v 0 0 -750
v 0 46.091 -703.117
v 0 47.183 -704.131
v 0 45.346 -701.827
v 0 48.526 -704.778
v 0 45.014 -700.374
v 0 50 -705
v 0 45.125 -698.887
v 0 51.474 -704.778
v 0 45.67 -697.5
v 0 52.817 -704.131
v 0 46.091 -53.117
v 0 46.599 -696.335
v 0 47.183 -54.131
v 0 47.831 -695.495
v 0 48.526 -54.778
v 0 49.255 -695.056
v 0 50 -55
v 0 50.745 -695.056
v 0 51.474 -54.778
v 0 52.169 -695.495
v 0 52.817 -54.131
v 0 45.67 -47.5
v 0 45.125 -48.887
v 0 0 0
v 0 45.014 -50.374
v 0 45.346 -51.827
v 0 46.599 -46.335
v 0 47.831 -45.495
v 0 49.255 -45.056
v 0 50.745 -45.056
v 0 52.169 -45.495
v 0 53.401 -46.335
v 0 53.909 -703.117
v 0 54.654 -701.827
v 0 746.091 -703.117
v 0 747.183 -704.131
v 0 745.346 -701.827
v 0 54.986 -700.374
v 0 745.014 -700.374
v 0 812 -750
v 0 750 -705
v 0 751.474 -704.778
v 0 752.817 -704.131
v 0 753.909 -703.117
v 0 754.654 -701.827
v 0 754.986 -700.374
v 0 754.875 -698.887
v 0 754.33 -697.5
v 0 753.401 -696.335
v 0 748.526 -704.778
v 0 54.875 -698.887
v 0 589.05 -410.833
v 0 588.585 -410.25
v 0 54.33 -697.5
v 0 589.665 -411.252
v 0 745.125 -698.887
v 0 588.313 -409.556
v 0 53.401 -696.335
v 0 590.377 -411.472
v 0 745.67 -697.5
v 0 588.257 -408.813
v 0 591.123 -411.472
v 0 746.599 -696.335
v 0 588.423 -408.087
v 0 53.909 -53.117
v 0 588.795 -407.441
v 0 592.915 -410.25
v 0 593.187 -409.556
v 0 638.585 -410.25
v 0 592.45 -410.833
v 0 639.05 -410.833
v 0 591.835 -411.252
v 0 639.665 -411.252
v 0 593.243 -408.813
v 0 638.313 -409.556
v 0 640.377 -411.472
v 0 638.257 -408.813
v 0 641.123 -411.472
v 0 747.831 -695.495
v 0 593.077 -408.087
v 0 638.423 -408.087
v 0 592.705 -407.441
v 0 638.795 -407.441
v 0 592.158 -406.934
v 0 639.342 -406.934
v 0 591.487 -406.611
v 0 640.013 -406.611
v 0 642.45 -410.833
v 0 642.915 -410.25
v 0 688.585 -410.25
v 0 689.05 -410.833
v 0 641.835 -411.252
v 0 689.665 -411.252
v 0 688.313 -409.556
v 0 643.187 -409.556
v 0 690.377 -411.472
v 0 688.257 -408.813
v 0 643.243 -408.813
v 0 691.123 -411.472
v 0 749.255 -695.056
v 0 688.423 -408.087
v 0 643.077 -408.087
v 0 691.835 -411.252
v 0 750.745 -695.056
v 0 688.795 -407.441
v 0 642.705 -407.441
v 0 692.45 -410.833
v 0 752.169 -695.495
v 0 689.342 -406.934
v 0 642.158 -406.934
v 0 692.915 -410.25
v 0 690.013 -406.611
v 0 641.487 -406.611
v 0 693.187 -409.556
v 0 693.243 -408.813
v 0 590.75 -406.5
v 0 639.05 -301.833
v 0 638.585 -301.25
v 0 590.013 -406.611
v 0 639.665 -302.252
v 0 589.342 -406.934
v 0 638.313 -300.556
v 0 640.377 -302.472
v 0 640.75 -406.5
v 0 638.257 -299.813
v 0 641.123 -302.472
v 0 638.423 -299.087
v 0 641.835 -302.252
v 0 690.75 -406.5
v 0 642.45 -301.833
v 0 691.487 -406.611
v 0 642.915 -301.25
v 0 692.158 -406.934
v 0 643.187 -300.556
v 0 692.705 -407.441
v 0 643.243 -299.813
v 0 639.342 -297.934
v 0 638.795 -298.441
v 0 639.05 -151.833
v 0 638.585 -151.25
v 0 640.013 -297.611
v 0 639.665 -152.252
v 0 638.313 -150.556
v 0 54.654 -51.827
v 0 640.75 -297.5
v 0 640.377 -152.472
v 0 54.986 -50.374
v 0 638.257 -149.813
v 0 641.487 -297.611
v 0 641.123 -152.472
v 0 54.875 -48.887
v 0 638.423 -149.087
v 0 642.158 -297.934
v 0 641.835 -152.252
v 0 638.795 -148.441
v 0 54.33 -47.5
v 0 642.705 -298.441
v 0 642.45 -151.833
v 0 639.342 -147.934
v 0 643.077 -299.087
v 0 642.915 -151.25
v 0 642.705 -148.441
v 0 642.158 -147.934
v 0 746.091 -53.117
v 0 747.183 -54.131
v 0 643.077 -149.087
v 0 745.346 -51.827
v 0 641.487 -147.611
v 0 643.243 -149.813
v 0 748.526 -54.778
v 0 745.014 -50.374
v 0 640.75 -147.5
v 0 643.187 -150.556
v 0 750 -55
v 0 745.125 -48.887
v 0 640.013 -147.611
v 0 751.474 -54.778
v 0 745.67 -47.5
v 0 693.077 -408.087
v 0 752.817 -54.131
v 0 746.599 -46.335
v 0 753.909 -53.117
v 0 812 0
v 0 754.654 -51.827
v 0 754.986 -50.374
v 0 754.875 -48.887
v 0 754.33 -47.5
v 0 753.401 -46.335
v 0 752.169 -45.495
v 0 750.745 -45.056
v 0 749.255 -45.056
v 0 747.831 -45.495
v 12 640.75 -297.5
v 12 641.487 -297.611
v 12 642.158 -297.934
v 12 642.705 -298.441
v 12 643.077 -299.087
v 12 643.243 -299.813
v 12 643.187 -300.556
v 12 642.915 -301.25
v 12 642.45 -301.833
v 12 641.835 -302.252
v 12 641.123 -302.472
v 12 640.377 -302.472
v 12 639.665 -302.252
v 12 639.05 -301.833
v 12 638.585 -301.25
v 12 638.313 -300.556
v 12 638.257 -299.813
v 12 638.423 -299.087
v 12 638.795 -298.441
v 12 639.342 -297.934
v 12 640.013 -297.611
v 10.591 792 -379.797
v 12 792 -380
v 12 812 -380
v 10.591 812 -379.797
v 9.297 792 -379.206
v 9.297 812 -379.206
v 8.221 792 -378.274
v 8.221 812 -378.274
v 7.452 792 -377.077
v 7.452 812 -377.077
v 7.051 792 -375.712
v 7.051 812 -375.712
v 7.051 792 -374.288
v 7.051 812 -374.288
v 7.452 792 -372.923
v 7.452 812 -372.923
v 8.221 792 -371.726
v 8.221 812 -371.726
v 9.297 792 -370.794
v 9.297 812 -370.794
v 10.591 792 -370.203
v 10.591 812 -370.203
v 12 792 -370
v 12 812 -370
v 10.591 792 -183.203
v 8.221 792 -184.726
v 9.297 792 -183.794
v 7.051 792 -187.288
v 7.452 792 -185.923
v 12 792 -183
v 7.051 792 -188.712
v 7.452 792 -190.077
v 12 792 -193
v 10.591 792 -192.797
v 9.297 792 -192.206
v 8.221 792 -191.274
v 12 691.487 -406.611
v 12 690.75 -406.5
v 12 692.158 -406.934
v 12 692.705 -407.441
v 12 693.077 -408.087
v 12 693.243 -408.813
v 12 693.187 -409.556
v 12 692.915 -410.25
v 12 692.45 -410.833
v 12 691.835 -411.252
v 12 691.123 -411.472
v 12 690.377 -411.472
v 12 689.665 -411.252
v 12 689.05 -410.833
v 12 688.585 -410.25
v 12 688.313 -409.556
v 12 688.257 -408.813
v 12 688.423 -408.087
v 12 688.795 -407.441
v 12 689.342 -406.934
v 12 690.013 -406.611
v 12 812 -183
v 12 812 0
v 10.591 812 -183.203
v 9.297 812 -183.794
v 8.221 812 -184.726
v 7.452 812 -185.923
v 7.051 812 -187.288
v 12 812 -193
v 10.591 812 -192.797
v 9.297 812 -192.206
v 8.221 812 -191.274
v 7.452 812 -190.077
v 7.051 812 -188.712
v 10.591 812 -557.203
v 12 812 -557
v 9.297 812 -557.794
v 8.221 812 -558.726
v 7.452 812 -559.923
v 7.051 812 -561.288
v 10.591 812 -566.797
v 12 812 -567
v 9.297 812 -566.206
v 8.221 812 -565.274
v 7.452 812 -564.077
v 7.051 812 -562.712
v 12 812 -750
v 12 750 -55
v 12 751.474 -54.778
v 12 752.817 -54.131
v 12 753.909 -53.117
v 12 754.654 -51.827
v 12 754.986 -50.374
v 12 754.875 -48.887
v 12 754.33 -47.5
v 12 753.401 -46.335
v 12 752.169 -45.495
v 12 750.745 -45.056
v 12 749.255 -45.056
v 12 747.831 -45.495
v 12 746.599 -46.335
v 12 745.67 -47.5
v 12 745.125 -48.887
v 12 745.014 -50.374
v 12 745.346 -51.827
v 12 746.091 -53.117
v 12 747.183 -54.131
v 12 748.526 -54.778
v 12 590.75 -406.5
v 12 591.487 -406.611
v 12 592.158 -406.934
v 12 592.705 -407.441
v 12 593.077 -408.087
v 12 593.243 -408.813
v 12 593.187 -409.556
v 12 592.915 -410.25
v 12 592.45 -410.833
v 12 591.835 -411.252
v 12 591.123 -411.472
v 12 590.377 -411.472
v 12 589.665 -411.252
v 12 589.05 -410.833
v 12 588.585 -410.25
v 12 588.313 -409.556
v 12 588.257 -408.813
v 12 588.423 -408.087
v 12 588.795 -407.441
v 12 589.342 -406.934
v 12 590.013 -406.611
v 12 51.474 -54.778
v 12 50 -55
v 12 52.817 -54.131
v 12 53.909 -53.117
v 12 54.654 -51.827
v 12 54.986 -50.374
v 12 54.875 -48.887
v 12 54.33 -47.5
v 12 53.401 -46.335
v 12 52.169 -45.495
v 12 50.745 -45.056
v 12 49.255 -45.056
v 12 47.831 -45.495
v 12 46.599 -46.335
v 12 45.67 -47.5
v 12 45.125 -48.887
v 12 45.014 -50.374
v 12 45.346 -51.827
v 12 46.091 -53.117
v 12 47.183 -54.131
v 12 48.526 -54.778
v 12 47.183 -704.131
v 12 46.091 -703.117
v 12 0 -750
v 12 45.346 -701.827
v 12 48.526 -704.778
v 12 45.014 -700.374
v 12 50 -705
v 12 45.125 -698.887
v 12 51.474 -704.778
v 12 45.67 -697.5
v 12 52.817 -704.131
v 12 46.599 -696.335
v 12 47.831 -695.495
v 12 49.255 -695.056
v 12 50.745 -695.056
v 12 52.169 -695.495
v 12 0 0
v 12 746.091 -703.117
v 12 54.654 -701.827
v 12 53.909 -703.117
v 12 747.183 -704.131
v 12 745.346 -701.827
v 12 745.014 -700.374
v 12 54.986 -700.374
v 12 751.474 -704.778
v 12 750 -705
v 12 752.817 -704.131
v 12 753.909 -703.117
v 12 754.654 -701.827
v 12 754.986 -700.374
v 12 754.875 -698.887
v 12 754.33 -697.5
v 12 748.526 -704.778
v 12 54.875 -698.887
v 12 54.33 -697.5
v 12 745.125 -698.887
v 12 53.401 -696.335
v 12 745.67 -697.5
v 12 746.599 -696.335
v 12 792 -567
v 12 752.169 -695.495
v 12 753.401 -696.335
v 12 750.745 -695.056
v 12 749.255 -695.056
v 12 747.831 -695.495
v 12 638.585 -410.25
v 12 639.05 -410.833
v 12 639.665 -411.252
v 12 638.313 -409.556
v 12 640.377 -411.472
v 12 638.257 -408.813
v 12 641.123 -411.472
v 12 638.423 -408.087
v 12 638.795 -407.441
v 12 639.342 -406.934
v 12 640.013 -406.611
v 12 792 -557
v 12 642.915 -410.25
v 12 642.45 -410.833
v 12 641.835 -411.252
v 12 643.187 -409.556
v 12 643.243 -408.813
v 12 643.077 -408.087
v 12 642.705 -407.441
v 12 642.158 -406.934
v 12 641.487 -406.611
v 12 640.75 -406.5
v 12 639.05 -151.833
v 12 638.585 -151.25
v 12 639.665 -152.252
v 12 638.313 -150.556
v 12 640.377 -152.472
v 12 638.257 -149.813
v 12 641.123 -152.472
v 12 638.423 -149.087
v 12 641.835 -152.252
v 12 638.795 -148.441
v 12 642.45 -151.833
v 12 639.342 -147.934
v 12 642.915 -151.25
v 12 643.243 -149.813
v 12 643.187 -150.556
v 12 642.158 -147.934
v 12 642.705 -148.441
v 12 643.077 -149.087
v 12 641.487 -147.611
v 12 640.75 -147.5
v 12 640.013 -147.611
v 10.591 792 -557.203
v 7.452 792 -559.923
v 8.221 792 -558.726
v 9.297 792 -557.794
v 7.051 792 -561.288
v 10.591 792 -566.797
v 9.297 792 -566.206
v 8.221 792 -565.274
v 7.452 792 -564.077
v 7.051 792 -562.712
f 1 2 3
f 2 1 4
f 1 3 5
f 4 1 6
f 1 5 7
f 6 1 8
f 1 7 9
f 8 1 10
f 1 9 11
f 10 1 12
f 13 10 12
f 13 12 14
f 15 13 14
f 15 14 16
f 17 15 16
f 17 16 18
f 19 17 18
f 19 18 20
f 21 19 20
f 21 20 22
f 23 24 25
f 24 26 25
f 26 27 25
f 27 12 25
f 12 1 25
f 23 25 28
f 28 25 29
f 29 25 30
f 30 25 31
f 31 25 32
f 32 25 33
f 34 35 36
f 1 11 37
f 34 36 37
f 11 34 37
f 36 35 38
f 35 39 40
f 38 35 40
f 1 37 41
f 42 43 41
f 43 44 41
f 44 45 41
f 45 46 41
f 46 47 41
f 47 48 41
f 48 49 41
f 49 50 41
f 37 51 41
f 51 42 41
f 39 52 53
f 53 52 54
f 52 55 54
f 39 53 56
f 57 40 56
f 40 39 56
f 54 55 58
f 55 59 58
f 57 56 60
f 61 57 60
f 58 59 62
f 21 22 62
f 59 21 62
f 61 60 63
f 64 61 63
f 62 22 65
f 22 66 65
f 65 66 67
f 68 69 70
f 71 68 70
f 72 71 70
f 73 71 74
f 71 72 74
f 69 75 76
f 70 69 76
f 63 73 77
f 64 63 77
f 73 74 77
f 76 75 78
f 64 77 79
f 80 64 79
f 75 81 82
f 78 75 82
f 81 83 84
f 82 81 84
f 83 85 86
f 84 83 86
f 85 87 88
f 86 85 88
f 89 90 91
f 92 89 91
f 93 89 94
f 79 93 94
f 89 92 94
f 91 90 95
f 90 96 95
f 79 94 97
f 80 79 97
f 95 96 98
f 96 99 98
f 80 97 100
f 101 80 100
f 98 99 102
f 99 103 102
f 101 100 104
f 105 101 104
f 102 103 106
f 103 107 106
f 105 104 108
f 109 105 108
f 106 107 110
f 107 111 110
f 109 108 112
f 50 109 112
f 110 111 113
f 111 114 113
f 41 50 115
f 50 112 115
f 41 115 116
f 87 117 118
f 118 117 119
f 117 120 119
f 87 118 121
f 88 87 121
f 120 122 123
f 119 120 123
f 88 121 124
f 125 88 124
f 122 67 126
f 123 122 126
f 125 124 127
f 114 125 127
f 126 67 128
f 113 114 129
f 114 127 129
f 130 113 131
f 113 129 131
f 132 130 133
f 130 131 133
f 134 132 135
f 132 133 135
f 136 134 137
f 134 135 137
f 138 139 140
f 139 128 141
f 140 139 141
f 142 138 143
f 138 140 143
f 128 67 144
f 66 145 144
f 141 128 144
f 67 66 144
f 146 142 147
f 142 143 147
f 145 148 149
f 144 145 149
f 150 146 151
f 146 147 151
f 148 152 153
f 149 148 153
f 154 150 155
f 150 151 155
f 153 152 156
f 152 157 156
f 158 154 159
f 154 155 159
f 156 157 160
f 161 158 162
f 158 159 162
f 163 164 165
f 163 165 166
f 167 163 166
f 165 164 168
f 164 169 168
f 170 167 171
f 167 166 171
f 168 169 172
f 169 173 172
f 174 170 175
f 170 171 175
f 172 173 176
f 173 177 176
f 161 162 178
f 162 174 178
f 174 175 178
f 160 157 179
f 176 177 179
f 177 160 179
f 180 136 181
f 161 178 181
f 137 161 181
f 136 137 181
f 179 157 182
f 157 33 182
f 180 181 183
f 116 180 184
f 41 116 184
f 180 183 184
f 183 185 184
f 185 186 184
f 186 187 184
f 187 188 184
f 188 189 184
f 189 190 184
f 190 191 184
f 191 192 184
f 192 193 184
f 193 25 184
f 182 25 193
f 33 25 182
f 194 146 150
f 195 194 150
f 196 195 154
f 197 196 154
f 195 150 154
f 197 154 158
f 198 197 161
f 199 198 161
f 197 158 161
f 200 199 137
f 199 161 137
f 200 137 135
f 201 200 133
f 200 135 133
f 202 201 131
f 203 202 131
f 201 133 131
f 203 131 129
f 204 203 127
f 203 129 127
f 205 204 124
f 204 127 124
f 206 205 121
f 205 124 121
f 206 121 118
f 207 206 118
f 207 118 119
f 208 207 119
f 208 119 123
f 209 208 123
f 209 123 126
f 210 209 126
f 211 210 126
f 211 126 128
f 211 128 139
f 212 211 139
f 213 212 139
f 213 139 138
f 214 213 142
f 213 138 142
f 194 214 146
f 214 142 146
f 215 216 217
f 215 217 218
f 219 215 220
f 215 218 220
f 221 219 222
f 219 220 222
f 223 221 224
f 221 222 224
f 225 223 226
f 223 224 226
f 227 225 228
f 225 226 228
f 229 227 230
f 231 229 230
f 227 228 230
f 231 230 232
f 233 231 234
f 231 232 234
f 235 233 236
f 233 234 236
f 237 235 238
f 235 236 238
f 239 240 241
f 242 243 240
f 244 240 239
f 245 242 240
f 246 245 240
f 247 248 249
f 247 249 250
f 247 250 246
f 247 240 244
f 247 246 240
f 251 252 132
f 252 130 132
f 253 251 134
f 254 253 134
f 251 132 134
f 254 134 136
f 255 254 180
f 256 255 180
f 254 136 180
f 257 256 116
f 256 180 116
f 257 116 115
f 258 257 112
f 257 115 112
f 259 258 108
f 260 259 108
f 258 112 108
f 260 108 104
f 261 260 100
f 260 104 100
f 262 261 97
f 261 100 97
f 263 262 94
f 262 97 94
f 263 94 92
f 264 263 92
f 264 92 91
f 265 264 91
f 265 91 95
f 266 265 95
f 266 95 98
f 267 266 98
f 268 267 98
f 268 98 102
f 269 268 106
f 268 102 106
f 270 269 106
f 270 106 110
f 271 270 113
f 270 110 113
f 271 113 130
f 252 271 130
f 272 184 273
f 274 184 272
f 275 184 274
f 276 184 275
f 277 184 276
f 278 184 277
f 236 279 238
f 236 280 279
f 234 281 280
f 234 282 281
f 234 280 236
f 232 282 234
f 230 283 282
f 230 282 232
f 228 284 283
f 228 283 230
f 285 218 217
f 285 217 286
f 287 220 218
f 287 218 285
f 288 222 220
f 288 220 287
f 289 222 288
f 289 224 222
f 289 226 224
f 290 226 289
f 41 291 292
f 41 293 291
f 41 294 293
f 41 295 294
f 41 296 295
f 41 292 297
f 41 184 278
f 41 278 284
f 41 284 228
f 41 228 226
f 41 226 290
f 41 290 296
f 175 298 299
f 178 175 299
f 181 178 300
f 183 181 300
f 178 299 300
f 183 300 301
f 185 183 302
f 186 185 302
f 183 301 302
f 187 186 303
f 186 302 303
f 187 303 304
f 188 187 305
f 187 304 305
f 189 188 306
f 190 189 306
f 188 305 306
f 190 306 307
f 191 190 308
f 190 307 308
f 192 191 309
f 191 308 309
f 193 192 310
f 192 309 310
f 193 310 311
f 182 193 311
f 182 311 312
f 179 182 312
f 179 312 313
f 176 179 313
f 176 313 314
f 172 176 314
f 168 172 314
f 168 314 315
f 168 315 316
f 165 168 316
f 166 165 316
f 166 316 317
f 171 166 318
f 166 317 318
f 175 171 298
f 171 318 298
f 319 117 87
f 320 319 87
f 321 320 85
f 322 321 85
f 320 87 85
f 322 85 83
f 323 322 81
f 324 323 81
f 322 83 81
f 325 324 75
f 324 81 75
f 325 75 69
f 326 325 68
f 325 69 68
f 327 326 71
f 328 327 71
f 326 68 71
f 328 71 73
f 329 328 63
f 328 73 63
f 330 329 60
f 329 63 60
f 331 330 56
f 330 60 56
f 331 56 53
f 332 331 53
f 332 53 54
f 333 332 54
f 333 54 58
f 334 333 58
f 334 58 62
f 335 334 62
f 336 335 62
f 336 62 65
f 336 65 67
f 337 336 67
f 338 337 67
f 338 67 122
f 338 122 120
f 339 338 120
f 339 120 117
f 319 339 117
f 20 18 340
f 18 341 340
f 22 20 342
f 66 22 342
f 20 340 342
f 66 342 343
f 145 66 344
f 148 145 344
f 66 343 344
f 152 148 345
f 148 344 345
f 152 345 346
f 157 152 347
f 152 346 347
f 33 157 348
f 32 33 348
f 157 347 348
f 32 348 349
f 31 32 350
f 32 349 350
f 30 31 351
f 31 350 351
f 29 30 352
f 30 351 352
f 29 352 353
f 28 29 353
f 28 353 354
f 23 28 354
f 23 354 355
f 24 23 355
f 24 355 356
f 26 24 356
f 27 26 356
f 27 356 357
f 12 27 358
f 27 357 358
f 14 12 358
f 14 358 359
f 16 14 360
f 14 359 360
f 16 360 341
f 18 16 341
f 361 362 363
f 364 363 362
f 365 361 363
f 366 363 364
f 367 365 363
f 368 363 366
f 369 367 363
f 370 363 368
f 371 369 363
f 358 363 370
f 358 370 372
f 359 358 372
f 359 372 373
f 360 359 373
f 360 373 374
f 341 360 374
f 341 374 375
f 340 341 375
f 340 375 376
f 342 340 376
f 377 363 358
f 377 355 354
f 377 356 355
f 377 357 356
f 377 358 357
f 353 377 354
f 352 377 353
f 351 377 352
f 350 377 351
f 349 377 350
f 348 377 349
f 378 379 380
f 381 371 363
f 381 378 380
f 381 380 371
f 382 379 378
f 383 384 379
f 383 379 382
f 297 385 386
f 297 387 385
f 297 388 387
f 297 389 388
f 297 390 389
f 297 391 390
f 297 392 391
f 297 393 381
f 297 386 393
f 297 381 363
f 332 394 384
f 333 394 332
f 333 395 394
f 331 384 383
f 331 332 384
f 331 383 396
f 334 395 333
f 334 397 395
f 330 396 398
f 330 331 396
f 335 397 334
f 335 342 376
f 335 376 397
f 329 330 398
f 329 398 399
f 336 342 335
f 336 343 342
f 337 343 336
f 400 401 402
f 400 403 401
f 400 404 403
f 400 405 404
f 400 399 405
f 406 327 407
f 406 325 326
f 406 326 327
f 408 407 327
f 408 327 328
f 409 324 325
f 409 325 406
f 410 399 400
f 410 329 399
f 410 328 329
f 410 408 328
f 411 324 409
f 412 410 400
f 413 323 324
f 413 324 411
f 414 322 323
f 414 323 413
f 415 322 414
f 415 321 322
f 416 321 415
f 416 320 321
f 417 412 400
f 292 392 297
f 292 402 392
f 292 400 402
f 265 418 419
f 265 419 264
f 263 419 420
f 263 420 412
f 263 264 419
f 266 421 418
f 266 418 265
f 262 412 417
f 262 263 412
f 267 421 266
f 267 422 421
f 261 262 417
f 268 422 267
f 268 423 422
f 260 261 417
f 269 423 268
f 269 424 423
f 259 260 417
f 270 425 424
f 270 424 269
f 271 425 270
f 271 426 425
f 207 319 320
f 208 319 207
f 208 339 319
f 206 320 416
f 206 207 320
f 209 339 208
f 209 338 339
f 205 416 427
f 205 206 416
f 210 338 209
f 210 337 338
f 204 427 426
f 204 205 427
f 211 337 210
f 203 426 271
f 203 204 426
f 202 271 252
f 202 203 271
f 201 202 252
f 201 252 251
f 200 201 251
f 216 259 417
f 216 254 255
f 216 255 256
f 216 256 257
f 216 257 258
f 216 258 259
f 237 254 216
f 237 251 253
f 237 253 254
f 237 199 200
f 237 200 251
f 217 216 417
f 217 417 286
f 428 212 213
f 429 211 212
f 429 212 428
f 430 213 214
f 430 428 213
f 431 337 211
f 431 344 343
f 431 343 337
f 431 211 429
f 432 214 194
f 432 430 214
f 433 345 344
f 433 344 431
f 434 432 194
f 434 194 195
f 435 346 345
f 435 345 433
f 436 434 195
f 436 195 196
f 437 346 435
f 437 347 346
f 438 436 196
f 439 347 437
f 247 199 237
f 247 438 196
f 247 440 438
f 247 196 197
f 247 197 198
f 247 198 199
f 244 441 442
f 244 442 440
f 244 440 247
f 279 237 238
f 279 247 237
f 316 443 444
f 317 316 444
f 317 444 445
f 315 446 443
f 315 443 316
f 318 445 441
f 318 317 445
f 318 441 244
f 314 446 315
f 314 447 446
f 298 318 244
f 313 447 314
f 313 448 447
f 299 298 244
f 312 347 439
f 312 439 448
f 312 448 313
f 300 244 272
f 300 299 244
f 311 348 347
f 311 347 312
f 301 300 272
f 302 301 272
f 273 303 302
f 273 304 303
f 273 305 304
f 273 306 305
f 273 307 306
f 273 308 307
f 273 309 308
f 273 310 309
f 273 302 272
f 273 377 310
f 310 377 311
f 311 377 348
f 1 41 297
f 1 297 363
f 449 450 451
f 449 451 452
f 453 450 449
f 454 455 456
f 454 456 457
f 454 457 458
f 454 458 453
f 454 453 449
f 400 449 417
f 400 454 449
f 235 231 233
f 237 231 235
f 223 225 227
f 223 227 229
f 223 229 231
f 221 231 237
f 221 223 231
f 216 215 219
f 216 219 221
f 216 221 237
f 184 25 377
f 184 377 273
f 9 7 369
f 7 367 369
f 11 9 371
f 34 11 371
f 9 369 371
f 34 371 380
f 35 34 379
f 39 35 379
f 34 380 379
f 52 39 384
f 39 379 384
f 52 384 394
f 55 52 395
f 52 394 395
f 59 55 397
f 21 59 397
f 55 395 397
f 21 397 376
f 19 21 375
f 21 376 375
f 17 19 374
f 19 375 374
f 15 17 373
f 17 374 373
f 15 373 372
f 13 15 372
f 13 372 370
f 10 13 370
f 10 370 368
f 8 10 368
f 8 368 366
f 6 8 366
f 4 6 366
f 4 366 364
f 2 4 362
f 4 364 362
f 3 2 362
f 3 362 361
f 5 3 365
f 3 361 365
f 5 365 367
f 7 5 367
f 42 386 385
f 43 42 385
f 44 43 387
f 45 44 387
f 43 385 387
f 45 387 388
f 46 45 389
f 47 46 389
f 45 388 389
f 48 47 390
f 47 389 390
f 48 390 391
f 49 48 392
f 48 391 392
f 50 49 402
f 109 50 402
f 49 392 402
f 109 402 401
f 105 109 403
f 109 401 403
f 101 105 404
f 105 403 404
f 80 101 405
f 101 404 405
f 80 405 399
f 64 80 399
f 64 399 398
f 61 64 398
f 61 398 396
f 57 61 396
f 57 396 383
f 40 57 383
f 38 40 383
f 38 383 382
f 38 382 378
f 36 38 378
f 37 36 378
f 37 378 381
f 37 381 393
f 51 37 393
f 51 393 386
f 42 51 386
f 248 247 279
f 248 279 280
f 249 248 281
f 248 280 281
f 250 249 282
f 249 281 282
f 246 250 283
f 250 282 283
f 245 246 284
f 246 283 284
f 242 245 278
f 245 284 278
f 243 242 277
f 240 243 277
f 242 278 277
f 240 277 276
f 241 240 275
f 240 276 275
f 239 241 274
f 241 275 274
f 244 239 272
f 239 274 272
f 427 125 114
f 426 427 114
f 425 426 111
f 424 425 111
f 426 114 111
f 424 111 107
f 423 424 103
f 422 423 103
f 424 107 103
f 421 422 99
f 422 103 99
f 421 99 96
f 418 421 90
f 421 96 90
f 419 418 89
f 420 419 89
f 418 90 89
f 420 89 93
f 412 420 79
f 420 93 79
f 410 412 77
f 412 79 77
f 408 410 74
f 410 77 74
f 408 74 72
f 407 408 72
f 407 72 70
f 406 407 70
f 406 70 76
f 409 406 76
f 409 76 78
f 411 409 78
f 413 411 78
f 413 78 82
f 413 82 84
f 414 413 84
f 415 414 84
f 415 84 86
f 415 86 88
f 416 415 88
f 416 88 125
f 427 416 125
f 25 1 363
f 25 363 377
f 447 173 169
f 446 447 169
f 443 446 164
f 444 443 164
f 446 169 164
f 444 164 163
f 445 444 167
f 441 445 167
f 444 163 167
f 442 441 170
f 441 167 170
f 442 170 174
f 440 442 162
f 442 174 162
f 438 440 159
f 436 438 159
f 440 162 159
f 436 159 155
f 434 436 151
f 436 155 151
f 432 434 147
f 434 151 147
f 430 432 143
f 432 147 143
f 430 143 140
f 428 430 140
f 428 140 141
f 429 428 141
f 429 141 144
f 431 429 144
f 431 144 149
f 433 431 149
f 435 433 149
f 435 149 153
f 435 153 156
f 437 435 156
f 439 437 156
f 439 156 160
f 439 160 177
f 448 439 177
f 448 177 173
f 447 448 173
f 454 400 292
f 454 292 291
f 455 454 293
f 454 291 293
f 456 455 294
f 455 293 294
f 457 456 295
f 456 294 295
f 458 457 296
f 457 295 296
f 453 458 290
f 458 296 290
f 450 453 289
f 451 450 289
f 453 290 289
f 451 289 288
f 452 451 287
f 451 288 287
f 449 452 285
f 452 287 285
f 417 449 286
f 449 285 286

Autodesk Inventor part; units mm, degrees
ref_plane "YZ Plane" through (0, 0, 0) normal (1, 0, 0) x (0, 1, 0)
ref_plane "XZ Plane" through (0, 0, 0) normal (0, 1, 0) x (-1, 0, 0)
ref_plane "XY Plane" through (0, 0, 0) normal (0, 0, 1) x (1, 0, 0)
sketch "Sketch1" plane through (0, 0, 0) normal (1, 0, 0) x (0, 1, 0)
  line L0 (0, 0) -> (812, 0)
  line L1 (812, 0) -> (812, -750)
  line L2 (812, -750) -> (0, -750)
  line L3 (0, -750) -> (0, 0)
  dimension "d2" = 812
  dimension "d3" = 750
extrude "Extrusion1" add sketch "Sketch1" along normal blind 12
sketch "Sketch2" plane through (12, 0, 0) normal (1, 0, 0) x (0, 0, -1)
  circle A0 centre (50, 50) radius 5
  circle A1 centre (700, 50) radius 5
  circle A2 centre (700, 750) radius 5
  circle A3 centre (50, 750) radius 5
  point P0 (0, 0)
  point P1 (750, 812)
  point P2 (750, 0)
  dimension "d15" = 10
extrude "Extrusion2" cut sketch "Sketch2" against normal blind 12
sketch "Sketch3" plane through (0, 812, 0) normal (0, 1, 0) x (1, 0, 0)
  line L0 (12, 375) -> (199, 375) construction
  circle A0 centre (12, 188) radius 5
  circle A1 centre (12, 375) radius 5
  circle A2 centre (12, 562) radius 5
  point P0 (0, 0)
  point P1 (12, 750)
  dimension "d23" = 10
  dimension "d24" = 10
  dimension "d25" = 10
extrude "Extrusion3" cut sketch "Sketch3" against normal blind 20
sketch "Sketch4" plane through (0, 0, 0) normal (-1, 0, 0) x (0, 0, 1)
  circle A0 centre (-300, 640.75) radius 2.5
  circle A1 centre (-150, 640.75) radius 2.5
  point P0 (0, 812)
extrude "Extrusion4" cut sketch "Sketch4" against normal blind 20
sketch "Sketch5" plane through (0, 0, 0) normal (-1, 0, 0) x (0, 0, 1)
  circle A0 centre (-300, 640.75) radius 2.5 projected
  line L0 (-300, 640.75) -> (-191, 640.75) construction
  circle A1 centre (-409, 640.75) radius 2.5
  circle A2 centre (-409, 590.75) radius 2.5
  circle A3 centre (-409, 690.75) radius 2.5
  point P0 (0, 0)
  dimension "d40" = 5
  dimension "d41" = 5
  dimension "d42" = 5
extrude "Extrusion5" cut sketch "Sketch5" against normal blind 211.375 contours A1 | A2 | A3
properties part number "wallL2" material "Plywood, Sheathing"
